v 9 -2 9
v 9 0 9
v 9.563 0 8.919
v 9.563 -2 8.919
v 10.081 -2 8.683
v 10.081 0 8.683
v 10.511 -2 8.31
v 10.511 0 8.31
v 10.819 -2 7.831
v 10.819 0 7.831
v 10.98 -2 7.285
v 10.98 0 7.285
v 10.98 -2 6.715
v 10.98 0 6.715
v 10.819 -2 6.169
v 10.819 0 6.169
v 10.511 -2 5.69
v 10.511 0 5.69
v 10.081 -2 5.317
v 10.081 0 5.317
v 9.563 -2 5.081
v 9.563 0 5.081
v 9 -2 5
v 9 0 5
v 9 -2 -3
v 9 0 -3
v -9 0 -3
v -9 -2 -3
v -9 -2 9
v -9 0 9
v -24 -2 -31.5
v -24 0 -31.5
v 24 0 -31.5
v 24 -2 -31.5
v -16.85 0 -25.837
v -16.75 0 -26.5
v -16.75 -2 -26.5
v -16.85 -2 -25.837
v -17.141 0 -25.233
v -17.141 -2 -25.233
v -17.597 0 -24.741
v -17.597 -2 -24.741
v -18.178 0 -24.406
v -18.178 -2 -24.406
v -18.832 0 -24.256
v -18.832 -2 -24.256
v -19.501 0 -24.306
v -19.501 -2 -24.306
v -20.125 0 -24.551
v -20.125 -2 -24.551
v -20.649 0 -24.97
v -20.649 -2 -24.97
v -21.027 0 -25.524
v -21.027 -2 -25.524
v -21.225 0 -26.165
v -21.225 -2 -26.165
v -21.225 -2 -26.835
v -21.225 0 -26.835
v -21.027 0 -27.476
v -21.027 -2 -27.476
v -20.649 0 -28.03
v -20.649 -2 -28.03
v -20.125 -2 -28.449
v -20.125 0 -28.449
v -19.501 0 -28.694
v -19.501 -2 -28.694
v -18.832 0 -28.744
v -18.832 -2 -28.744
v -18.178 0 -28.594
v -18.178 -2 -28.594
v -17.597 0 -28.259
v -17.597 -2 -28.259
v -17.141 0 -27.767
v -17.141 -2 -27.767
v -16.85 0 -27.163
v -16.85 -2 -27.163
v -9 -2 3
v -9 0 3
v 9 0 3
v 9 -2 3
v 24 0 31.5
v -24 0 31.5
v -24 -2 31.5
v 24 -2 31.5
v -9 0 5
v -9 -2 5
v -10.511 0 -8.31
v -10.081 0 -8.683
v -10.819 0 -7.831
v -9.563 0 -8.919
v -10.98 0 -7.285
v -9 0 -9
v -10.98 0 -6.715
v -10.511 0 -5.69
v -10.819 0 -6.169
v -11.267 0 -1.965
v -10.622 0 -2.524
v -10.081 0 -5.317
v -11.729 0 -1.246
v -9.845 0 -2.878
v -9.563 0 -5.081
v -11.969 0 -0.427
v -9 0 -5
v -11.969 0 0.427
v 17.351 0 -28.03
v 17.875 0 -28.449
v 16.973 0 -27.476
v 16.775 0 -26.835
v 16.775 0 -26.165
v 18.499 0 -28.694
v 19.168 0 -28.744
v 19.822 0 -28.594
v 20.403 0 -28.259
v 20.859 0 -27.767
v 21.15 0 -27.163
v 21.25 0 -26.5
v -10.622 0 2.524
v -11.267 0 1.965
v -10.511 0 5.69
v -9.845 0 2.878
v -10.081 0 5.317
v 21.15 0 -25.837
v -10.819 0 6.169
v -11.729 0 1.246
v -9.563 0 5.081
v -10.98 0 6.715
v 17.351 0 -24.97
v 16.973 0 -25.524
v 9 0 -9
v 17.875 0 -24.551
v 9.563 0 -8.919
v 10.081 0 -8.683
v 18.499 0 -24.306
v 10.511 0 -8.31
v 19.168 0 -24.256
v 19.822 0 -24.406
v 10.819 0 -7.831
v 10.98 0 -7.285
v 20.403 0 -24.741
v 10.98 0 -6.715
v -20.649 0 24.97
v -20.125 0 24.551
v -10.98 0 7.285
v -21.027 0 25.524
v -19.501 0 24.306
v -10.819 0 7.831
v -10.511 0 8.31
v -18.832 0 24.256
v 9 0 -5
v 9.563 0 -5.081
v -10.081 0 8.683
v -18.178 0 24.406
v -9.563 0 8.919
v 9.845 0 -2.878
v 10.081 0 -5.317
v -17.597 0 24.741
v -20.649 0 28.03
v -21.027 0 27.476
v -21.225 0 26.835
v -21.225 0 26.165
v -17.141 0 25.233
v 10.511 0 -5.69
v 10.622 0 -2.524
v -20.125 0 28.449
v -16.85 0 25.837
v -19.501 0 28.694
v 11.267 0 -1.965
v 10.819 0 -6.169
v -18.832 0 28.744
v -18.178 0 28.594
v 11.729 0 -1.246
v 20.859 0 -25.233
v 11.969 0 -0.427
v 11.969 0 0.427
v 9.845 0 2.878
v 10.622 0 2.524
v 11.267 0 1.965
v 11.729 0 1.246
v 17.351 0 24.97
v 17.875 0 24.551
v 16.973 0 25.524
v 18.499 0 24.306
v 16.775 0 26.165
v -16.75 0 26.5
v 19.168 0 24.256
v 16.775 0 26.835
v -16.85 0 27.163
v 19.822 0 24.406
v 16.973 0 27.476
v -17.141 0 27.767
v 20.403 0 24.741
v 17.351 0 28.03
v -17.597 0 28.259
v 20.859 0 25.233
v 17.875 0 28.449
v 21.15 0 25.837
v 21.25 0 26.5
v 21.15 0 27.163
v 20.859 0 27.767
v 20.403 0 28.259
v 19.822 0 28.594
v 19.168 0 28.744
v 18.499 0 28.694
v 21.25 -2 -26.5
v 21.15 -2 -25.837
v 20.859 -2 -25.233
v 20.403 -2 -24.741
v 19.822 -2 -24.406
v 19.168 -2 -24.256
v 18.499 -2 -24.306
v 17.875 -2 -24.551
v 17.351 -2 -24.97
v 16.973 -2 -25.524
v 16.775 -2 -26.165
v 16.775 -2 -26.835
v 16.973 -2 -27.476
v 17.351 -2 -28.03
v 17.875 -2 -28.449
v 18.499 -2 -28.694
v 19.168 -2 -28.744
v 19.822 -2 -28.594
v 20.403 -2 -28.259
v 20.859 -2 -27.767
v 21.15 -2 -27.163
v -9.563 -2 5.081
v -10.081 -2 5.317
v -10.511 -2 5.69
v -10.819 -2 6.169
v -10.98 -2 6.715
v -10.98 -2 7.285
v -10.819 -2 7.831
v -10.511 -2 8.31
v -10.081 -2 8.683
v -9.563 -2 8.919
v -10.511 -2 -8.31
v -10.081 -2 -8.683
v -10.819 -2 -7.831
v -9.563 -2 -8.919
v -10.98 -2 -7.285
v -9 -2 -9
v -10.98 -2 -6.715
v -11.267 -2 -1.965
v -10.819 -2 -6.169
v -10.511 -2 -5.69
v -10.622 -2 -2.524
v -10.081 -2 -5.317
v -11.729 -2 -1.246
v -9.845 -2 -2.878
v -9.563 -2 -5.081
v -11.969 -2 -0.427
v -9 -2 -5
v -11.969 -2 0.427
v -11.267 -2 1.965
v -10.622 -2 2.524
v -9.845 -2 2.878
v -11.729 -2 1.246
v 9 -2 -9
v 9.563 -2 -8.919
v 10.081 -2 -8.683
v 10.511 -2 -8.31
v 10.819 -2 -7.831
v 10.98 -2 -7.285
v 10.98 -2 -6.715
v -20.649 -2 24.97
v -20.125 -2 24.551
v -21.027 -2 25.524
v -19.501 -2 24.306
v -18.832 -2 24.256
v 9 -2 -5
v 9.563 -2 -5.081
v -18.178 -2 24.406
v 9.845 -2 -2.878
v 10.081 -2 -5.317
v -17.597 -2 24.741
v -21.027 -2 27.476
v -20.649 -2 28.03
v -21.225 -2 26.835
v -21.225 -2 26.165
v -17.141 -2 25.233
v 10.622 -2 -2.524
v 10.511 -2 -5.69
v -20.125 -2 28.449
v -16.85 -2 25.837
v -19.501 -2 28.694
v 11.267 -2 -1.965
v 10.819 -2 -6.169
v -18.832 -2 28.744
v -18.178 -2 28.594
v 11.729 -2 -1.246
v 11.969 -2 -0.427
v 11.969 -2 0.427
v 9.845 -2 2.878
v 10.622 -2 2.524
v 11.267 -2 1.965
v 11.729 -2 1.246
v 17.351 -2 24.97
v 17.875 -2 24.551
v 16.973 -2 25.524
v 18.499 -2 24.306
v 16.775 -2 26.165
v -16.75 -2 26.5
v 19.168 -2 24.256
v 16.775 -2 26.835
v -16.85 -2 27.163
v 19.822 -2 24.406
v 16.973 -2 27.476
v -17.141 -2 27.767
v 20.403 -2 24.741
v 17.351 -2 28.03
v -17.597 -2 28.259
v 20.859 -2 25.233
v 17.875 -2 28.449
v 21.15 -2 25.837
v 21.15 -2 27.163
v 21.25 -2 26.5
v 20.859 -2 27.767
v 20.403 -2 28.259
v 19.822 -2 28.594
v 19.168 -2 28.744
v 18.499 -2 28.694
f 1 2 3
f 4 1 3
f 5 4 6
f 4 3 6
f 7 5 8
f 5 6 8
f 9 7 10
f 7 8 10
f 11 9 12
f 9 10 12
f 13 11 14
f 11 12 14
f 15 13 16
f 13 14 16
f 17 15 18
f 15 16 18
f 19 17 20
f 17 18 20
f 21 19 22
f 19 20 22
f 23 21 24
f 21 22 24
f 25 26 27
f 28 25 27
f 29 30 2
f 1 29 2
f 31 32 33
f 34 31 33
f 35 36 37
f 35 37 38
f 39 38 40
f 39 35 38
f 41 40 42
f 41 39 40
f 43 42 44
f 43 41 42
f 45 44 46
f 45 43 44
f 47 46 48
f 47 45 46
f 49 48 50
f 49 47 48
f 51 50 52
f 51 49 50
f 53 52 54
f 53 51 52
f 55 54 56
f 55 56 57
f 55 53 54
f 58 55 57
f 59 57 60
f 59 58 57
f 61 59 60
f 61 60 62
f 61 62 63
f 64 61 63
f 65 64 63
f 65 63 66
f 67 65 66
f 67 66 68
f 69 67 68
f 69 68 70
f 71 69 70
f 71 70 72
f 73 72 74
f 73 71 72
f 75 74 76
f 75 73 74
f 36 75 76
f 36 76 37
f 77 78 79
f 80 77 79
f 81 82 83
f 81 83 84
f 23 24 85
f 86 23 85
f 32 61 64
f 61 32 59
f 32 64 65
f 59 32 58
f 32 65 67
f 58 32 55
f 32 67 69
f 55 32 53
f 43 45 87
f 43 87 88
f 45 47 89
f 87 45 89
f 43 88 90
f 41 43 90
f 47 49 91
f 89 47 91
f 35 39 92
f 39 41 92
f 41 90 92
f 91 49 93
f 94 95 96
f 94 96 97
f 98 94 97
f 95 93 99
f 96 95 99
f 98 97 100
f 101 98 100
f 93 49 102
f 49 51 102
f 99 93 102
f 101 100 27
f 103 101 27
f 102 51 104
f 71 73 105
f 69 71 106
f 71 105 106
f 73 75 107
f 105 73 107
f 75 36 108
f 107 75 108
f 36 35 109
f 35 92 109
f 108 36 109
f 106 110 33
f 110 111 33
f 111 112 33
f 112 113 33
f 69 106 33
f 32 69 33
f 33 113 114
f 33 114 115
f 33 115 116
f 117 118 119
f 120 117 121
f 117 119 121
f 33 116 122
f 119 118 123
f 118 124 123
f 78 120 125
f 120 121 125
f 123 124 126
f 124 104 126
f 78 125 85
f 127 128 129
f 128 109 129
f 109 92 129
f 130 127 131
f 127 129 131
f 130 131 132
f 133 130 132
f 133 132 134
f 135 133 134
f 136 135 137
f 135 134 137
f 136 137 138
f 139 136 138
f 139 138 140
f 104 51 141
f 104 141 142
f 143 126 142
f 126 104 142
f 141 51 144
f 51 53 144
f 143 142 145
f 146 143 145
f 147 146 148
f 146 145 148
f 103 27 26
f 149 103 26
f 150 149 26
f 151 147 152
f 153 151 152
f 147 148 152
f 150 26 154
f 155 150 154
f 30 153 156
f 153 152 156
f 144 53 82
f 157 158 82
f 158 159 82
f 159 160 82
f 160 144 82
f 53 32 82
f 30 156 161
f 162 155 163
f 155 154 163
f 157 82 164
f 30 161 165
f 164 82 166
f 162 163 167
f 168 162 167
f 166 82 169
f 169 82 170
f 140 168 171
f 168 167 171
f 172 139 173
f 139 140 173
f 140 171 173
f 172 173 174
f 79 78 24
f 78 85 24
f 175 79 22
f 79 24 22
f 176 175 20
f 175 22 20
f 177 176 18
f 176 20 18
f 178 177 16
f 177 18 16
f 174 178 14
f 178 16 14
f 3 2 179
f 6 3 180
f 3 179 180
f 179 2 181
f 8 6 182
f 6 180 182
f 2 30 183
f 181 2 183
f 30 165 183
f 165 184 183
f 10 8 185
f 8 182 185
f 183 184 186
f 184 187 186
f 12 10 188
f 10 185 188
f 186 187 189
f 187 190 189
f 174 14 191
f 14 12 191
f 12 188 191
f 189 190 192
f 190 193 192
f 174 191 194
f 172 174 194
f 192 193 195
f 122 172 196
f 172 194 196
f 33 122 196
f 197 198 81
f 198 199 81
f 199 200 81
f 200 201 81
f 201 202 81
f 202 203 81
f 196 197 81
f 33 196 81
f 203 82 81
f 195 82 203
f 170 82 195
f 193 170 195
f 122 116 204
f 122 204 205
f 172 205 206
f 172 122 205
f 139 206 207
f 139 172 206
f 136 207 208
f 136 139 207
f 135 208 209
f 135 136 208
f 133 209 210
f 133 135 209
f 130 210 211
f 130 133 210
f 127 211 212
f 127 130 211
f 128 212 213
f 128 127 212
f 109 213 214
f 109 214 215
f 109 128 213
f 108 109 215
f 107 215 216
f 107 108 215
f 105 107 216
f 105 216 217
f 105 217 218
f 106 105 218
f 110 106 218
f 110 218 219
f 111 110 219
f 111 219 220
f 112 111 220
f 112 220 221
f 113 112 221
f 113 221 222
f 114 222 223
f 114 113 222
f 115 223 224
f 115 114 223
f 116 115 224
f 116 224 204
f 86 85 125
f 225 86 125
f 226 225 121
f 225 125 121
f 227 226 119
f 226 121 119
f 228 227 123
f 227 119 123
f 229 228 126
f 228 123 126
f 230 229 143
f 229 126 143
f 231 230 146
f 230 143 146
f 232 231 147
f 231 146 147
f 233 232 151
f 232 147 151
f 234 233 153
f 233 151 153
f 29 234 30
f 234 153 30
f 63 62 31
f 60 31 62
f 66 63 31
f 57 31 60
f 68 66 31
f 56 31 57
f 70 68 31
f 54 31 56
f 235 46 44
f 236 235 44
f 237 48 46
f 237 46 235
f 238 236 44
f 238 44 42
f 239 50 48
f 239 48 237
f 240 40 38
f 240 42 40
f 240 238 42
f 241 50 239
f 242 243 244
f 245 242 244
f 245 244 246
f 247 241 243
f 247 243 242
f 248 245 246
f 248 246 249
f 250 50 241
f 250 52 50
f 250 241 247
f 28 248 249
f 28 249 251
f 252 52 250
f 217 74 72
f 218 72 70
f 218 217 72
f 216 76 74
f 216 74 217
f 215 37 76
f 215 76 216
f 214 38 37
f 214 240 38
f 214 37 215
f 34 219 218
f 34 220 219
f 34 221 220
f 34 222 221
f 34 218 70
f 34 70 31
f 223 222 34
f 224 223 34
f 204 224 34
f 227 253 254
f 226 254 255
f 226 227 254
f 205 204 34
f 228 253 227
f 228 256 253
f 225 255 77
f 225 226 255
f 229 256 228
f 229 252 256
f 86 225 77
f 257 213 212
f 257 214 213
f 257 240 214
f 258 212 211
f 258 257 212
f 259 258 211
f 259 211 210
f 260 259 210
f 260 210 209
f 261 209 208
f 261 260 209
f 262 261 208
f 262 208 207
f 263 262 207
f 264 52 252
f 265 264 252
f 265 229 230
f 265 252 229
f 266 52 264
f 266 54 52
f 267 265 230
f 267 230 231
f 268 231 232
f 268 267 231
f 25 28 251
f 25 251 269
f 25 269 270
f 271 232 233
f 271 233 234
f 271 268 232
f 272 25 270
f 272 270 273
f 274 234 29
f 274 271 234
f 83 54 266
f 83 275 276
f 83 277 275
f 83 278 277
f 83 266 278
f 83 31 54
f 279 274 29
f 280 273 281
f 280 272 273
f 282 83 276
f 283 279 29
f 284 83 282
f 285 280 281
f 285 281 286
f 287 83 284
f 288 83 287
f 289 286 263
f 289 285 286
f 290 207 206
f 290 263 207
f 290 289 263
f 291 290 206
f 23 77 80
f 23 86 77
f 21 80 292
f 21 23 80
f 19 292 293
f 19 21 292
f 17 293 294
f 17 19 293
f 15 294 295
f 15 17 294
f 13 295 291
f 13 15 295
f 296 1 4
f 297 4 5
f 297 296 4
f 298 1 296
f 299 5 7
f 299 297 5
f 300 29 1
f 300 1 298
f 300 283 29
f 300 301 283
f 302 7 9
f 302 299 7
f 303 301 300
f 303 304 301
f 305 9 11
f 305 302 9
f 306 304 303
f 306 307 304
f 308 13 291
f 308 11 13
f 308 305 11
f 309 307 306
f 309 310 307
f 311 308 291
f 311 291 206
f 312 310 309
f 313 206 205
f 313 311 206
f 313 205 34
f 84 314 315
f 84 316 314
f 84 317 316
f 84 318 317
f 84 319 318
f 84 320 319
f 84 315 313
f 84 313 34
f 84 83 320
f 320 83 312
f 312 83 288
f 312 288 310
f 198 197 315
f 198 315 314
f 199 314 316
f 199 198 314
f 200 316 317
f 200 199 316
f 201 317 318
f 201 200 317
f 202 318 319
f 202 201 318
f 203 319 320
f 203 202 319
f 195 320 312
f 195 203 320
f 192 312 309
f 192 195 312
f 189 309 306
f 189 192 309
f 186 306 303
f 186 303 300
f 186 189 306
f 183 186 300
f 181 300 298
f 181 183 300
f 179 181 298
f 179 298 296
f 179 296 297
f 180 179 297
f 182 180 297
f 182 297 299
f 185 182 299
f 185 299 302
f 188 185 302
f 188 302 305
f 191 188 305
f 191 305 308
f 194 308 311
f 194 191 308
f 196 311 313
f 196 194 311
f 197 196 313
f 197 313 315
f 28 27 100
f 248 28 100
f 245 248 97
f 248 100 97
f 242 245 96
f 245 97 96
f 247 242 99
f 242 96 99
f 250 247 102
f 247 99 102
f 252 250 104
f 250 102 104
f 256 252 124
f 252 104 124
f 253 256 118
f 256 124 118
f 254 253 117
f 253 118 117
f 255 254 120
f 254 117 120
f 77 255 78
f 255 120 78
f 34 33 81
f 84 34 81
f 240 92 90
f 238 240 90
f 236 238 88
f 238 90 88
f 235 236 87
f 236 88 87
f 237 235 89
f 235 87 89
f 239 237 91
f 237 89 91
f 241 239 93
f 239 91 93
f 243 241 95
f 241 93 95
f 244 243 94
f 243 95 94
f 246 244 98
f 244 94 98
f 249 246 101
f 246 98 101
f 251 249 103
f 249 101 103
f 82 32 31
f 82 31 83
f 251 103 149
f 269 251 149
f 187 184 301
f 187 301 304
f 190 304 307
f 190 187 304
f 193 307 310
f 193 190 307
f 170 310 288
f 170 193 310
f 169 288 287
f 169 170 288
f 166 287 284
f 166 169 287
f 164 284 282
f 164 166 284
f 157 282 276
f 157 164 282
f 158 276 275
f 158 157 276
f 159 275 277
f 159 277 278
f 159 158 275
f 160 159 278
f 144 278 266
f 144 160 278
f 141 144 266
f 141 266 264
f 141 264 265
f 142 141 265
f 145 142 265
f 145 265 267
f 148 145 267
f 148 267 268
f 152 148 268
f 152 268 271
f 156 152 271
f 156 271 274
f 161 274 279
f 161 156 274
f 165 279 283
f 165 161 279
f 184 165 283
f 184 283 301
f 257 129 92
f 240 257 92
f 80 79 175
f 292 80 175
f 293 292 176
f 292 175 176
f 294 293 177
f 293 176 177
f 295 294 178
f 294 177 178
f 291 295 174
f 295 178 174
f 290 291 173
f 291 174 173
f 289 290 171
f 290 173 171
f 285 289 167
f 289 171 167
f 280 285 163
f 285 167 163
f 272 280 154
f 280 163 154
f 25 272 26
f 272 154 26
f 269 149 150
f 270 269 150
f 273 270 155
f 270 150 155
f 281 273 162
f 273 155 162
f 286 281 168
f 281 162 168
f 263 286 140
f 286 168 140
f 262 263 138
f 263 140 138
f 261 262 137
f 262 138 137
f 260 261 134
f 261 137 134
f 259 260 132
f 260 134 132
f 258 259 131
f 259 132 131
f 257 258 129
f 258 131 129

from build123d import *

# Parameters (mm, degrees)
F0_W     = 48
F0_H     = 63
F0_R     = 2.25
F1_DEPTH = 2


with BuildPart() as f1:
    # F0 (on Front) → F1 (new body)
    with BuildSketch(Plane.XZ):
        Rectangle(F0_W, F0_H)
        with Locations((-19, -26.5)):
            Circle(F0_R, mode=Mode.SUBTRACT)
        with Locations((19, -26.5)):
            Circle(F0_R, mode=Mode.SUBTRACT)
        with BuildLine():
            ThreePointArc((9, -5), (11, -7), (9, -9))
            Line((9, -9), (-9, -9))
            ThreePointArc((-9, -9), (-11, -7), (-9, -5))
            Line((-9, -5), (9, -5))
        make_face(mode=Mode.SUBTRACT)
        with Locations((-19, 26.5)):
            Circle(F0_R, mode=Mode.SUBTRACT)
        with BuildLine():
            Line((-9, 3), (9, 3))
            ThreePointArc((9, 3), (12, 0), (9, -3))
            Line((9, -3), (-9, -3))
            ThreePointArc((-9, -3), (-12, 0), (-9, 3))
        make_face(mode=Mode.SUBTRACT)
        with BuildLine():
            ThreePointArc((9, 9), (11, 7), (9, 5))
            Line((9, 5), (-9, 5))
            ThreePointArc((-9, 5), (-11, 7), (-9, 9))
            Line((-9, 9), (9, 9))
        make_face(mode=Mode.SUBTRACT)
        with Locations((19, 26.5)):
            Circle(F0_R, mode=Mode.SUBTRACT)
    extrude(amount=F1_DEPTH)


solid = f1.part
